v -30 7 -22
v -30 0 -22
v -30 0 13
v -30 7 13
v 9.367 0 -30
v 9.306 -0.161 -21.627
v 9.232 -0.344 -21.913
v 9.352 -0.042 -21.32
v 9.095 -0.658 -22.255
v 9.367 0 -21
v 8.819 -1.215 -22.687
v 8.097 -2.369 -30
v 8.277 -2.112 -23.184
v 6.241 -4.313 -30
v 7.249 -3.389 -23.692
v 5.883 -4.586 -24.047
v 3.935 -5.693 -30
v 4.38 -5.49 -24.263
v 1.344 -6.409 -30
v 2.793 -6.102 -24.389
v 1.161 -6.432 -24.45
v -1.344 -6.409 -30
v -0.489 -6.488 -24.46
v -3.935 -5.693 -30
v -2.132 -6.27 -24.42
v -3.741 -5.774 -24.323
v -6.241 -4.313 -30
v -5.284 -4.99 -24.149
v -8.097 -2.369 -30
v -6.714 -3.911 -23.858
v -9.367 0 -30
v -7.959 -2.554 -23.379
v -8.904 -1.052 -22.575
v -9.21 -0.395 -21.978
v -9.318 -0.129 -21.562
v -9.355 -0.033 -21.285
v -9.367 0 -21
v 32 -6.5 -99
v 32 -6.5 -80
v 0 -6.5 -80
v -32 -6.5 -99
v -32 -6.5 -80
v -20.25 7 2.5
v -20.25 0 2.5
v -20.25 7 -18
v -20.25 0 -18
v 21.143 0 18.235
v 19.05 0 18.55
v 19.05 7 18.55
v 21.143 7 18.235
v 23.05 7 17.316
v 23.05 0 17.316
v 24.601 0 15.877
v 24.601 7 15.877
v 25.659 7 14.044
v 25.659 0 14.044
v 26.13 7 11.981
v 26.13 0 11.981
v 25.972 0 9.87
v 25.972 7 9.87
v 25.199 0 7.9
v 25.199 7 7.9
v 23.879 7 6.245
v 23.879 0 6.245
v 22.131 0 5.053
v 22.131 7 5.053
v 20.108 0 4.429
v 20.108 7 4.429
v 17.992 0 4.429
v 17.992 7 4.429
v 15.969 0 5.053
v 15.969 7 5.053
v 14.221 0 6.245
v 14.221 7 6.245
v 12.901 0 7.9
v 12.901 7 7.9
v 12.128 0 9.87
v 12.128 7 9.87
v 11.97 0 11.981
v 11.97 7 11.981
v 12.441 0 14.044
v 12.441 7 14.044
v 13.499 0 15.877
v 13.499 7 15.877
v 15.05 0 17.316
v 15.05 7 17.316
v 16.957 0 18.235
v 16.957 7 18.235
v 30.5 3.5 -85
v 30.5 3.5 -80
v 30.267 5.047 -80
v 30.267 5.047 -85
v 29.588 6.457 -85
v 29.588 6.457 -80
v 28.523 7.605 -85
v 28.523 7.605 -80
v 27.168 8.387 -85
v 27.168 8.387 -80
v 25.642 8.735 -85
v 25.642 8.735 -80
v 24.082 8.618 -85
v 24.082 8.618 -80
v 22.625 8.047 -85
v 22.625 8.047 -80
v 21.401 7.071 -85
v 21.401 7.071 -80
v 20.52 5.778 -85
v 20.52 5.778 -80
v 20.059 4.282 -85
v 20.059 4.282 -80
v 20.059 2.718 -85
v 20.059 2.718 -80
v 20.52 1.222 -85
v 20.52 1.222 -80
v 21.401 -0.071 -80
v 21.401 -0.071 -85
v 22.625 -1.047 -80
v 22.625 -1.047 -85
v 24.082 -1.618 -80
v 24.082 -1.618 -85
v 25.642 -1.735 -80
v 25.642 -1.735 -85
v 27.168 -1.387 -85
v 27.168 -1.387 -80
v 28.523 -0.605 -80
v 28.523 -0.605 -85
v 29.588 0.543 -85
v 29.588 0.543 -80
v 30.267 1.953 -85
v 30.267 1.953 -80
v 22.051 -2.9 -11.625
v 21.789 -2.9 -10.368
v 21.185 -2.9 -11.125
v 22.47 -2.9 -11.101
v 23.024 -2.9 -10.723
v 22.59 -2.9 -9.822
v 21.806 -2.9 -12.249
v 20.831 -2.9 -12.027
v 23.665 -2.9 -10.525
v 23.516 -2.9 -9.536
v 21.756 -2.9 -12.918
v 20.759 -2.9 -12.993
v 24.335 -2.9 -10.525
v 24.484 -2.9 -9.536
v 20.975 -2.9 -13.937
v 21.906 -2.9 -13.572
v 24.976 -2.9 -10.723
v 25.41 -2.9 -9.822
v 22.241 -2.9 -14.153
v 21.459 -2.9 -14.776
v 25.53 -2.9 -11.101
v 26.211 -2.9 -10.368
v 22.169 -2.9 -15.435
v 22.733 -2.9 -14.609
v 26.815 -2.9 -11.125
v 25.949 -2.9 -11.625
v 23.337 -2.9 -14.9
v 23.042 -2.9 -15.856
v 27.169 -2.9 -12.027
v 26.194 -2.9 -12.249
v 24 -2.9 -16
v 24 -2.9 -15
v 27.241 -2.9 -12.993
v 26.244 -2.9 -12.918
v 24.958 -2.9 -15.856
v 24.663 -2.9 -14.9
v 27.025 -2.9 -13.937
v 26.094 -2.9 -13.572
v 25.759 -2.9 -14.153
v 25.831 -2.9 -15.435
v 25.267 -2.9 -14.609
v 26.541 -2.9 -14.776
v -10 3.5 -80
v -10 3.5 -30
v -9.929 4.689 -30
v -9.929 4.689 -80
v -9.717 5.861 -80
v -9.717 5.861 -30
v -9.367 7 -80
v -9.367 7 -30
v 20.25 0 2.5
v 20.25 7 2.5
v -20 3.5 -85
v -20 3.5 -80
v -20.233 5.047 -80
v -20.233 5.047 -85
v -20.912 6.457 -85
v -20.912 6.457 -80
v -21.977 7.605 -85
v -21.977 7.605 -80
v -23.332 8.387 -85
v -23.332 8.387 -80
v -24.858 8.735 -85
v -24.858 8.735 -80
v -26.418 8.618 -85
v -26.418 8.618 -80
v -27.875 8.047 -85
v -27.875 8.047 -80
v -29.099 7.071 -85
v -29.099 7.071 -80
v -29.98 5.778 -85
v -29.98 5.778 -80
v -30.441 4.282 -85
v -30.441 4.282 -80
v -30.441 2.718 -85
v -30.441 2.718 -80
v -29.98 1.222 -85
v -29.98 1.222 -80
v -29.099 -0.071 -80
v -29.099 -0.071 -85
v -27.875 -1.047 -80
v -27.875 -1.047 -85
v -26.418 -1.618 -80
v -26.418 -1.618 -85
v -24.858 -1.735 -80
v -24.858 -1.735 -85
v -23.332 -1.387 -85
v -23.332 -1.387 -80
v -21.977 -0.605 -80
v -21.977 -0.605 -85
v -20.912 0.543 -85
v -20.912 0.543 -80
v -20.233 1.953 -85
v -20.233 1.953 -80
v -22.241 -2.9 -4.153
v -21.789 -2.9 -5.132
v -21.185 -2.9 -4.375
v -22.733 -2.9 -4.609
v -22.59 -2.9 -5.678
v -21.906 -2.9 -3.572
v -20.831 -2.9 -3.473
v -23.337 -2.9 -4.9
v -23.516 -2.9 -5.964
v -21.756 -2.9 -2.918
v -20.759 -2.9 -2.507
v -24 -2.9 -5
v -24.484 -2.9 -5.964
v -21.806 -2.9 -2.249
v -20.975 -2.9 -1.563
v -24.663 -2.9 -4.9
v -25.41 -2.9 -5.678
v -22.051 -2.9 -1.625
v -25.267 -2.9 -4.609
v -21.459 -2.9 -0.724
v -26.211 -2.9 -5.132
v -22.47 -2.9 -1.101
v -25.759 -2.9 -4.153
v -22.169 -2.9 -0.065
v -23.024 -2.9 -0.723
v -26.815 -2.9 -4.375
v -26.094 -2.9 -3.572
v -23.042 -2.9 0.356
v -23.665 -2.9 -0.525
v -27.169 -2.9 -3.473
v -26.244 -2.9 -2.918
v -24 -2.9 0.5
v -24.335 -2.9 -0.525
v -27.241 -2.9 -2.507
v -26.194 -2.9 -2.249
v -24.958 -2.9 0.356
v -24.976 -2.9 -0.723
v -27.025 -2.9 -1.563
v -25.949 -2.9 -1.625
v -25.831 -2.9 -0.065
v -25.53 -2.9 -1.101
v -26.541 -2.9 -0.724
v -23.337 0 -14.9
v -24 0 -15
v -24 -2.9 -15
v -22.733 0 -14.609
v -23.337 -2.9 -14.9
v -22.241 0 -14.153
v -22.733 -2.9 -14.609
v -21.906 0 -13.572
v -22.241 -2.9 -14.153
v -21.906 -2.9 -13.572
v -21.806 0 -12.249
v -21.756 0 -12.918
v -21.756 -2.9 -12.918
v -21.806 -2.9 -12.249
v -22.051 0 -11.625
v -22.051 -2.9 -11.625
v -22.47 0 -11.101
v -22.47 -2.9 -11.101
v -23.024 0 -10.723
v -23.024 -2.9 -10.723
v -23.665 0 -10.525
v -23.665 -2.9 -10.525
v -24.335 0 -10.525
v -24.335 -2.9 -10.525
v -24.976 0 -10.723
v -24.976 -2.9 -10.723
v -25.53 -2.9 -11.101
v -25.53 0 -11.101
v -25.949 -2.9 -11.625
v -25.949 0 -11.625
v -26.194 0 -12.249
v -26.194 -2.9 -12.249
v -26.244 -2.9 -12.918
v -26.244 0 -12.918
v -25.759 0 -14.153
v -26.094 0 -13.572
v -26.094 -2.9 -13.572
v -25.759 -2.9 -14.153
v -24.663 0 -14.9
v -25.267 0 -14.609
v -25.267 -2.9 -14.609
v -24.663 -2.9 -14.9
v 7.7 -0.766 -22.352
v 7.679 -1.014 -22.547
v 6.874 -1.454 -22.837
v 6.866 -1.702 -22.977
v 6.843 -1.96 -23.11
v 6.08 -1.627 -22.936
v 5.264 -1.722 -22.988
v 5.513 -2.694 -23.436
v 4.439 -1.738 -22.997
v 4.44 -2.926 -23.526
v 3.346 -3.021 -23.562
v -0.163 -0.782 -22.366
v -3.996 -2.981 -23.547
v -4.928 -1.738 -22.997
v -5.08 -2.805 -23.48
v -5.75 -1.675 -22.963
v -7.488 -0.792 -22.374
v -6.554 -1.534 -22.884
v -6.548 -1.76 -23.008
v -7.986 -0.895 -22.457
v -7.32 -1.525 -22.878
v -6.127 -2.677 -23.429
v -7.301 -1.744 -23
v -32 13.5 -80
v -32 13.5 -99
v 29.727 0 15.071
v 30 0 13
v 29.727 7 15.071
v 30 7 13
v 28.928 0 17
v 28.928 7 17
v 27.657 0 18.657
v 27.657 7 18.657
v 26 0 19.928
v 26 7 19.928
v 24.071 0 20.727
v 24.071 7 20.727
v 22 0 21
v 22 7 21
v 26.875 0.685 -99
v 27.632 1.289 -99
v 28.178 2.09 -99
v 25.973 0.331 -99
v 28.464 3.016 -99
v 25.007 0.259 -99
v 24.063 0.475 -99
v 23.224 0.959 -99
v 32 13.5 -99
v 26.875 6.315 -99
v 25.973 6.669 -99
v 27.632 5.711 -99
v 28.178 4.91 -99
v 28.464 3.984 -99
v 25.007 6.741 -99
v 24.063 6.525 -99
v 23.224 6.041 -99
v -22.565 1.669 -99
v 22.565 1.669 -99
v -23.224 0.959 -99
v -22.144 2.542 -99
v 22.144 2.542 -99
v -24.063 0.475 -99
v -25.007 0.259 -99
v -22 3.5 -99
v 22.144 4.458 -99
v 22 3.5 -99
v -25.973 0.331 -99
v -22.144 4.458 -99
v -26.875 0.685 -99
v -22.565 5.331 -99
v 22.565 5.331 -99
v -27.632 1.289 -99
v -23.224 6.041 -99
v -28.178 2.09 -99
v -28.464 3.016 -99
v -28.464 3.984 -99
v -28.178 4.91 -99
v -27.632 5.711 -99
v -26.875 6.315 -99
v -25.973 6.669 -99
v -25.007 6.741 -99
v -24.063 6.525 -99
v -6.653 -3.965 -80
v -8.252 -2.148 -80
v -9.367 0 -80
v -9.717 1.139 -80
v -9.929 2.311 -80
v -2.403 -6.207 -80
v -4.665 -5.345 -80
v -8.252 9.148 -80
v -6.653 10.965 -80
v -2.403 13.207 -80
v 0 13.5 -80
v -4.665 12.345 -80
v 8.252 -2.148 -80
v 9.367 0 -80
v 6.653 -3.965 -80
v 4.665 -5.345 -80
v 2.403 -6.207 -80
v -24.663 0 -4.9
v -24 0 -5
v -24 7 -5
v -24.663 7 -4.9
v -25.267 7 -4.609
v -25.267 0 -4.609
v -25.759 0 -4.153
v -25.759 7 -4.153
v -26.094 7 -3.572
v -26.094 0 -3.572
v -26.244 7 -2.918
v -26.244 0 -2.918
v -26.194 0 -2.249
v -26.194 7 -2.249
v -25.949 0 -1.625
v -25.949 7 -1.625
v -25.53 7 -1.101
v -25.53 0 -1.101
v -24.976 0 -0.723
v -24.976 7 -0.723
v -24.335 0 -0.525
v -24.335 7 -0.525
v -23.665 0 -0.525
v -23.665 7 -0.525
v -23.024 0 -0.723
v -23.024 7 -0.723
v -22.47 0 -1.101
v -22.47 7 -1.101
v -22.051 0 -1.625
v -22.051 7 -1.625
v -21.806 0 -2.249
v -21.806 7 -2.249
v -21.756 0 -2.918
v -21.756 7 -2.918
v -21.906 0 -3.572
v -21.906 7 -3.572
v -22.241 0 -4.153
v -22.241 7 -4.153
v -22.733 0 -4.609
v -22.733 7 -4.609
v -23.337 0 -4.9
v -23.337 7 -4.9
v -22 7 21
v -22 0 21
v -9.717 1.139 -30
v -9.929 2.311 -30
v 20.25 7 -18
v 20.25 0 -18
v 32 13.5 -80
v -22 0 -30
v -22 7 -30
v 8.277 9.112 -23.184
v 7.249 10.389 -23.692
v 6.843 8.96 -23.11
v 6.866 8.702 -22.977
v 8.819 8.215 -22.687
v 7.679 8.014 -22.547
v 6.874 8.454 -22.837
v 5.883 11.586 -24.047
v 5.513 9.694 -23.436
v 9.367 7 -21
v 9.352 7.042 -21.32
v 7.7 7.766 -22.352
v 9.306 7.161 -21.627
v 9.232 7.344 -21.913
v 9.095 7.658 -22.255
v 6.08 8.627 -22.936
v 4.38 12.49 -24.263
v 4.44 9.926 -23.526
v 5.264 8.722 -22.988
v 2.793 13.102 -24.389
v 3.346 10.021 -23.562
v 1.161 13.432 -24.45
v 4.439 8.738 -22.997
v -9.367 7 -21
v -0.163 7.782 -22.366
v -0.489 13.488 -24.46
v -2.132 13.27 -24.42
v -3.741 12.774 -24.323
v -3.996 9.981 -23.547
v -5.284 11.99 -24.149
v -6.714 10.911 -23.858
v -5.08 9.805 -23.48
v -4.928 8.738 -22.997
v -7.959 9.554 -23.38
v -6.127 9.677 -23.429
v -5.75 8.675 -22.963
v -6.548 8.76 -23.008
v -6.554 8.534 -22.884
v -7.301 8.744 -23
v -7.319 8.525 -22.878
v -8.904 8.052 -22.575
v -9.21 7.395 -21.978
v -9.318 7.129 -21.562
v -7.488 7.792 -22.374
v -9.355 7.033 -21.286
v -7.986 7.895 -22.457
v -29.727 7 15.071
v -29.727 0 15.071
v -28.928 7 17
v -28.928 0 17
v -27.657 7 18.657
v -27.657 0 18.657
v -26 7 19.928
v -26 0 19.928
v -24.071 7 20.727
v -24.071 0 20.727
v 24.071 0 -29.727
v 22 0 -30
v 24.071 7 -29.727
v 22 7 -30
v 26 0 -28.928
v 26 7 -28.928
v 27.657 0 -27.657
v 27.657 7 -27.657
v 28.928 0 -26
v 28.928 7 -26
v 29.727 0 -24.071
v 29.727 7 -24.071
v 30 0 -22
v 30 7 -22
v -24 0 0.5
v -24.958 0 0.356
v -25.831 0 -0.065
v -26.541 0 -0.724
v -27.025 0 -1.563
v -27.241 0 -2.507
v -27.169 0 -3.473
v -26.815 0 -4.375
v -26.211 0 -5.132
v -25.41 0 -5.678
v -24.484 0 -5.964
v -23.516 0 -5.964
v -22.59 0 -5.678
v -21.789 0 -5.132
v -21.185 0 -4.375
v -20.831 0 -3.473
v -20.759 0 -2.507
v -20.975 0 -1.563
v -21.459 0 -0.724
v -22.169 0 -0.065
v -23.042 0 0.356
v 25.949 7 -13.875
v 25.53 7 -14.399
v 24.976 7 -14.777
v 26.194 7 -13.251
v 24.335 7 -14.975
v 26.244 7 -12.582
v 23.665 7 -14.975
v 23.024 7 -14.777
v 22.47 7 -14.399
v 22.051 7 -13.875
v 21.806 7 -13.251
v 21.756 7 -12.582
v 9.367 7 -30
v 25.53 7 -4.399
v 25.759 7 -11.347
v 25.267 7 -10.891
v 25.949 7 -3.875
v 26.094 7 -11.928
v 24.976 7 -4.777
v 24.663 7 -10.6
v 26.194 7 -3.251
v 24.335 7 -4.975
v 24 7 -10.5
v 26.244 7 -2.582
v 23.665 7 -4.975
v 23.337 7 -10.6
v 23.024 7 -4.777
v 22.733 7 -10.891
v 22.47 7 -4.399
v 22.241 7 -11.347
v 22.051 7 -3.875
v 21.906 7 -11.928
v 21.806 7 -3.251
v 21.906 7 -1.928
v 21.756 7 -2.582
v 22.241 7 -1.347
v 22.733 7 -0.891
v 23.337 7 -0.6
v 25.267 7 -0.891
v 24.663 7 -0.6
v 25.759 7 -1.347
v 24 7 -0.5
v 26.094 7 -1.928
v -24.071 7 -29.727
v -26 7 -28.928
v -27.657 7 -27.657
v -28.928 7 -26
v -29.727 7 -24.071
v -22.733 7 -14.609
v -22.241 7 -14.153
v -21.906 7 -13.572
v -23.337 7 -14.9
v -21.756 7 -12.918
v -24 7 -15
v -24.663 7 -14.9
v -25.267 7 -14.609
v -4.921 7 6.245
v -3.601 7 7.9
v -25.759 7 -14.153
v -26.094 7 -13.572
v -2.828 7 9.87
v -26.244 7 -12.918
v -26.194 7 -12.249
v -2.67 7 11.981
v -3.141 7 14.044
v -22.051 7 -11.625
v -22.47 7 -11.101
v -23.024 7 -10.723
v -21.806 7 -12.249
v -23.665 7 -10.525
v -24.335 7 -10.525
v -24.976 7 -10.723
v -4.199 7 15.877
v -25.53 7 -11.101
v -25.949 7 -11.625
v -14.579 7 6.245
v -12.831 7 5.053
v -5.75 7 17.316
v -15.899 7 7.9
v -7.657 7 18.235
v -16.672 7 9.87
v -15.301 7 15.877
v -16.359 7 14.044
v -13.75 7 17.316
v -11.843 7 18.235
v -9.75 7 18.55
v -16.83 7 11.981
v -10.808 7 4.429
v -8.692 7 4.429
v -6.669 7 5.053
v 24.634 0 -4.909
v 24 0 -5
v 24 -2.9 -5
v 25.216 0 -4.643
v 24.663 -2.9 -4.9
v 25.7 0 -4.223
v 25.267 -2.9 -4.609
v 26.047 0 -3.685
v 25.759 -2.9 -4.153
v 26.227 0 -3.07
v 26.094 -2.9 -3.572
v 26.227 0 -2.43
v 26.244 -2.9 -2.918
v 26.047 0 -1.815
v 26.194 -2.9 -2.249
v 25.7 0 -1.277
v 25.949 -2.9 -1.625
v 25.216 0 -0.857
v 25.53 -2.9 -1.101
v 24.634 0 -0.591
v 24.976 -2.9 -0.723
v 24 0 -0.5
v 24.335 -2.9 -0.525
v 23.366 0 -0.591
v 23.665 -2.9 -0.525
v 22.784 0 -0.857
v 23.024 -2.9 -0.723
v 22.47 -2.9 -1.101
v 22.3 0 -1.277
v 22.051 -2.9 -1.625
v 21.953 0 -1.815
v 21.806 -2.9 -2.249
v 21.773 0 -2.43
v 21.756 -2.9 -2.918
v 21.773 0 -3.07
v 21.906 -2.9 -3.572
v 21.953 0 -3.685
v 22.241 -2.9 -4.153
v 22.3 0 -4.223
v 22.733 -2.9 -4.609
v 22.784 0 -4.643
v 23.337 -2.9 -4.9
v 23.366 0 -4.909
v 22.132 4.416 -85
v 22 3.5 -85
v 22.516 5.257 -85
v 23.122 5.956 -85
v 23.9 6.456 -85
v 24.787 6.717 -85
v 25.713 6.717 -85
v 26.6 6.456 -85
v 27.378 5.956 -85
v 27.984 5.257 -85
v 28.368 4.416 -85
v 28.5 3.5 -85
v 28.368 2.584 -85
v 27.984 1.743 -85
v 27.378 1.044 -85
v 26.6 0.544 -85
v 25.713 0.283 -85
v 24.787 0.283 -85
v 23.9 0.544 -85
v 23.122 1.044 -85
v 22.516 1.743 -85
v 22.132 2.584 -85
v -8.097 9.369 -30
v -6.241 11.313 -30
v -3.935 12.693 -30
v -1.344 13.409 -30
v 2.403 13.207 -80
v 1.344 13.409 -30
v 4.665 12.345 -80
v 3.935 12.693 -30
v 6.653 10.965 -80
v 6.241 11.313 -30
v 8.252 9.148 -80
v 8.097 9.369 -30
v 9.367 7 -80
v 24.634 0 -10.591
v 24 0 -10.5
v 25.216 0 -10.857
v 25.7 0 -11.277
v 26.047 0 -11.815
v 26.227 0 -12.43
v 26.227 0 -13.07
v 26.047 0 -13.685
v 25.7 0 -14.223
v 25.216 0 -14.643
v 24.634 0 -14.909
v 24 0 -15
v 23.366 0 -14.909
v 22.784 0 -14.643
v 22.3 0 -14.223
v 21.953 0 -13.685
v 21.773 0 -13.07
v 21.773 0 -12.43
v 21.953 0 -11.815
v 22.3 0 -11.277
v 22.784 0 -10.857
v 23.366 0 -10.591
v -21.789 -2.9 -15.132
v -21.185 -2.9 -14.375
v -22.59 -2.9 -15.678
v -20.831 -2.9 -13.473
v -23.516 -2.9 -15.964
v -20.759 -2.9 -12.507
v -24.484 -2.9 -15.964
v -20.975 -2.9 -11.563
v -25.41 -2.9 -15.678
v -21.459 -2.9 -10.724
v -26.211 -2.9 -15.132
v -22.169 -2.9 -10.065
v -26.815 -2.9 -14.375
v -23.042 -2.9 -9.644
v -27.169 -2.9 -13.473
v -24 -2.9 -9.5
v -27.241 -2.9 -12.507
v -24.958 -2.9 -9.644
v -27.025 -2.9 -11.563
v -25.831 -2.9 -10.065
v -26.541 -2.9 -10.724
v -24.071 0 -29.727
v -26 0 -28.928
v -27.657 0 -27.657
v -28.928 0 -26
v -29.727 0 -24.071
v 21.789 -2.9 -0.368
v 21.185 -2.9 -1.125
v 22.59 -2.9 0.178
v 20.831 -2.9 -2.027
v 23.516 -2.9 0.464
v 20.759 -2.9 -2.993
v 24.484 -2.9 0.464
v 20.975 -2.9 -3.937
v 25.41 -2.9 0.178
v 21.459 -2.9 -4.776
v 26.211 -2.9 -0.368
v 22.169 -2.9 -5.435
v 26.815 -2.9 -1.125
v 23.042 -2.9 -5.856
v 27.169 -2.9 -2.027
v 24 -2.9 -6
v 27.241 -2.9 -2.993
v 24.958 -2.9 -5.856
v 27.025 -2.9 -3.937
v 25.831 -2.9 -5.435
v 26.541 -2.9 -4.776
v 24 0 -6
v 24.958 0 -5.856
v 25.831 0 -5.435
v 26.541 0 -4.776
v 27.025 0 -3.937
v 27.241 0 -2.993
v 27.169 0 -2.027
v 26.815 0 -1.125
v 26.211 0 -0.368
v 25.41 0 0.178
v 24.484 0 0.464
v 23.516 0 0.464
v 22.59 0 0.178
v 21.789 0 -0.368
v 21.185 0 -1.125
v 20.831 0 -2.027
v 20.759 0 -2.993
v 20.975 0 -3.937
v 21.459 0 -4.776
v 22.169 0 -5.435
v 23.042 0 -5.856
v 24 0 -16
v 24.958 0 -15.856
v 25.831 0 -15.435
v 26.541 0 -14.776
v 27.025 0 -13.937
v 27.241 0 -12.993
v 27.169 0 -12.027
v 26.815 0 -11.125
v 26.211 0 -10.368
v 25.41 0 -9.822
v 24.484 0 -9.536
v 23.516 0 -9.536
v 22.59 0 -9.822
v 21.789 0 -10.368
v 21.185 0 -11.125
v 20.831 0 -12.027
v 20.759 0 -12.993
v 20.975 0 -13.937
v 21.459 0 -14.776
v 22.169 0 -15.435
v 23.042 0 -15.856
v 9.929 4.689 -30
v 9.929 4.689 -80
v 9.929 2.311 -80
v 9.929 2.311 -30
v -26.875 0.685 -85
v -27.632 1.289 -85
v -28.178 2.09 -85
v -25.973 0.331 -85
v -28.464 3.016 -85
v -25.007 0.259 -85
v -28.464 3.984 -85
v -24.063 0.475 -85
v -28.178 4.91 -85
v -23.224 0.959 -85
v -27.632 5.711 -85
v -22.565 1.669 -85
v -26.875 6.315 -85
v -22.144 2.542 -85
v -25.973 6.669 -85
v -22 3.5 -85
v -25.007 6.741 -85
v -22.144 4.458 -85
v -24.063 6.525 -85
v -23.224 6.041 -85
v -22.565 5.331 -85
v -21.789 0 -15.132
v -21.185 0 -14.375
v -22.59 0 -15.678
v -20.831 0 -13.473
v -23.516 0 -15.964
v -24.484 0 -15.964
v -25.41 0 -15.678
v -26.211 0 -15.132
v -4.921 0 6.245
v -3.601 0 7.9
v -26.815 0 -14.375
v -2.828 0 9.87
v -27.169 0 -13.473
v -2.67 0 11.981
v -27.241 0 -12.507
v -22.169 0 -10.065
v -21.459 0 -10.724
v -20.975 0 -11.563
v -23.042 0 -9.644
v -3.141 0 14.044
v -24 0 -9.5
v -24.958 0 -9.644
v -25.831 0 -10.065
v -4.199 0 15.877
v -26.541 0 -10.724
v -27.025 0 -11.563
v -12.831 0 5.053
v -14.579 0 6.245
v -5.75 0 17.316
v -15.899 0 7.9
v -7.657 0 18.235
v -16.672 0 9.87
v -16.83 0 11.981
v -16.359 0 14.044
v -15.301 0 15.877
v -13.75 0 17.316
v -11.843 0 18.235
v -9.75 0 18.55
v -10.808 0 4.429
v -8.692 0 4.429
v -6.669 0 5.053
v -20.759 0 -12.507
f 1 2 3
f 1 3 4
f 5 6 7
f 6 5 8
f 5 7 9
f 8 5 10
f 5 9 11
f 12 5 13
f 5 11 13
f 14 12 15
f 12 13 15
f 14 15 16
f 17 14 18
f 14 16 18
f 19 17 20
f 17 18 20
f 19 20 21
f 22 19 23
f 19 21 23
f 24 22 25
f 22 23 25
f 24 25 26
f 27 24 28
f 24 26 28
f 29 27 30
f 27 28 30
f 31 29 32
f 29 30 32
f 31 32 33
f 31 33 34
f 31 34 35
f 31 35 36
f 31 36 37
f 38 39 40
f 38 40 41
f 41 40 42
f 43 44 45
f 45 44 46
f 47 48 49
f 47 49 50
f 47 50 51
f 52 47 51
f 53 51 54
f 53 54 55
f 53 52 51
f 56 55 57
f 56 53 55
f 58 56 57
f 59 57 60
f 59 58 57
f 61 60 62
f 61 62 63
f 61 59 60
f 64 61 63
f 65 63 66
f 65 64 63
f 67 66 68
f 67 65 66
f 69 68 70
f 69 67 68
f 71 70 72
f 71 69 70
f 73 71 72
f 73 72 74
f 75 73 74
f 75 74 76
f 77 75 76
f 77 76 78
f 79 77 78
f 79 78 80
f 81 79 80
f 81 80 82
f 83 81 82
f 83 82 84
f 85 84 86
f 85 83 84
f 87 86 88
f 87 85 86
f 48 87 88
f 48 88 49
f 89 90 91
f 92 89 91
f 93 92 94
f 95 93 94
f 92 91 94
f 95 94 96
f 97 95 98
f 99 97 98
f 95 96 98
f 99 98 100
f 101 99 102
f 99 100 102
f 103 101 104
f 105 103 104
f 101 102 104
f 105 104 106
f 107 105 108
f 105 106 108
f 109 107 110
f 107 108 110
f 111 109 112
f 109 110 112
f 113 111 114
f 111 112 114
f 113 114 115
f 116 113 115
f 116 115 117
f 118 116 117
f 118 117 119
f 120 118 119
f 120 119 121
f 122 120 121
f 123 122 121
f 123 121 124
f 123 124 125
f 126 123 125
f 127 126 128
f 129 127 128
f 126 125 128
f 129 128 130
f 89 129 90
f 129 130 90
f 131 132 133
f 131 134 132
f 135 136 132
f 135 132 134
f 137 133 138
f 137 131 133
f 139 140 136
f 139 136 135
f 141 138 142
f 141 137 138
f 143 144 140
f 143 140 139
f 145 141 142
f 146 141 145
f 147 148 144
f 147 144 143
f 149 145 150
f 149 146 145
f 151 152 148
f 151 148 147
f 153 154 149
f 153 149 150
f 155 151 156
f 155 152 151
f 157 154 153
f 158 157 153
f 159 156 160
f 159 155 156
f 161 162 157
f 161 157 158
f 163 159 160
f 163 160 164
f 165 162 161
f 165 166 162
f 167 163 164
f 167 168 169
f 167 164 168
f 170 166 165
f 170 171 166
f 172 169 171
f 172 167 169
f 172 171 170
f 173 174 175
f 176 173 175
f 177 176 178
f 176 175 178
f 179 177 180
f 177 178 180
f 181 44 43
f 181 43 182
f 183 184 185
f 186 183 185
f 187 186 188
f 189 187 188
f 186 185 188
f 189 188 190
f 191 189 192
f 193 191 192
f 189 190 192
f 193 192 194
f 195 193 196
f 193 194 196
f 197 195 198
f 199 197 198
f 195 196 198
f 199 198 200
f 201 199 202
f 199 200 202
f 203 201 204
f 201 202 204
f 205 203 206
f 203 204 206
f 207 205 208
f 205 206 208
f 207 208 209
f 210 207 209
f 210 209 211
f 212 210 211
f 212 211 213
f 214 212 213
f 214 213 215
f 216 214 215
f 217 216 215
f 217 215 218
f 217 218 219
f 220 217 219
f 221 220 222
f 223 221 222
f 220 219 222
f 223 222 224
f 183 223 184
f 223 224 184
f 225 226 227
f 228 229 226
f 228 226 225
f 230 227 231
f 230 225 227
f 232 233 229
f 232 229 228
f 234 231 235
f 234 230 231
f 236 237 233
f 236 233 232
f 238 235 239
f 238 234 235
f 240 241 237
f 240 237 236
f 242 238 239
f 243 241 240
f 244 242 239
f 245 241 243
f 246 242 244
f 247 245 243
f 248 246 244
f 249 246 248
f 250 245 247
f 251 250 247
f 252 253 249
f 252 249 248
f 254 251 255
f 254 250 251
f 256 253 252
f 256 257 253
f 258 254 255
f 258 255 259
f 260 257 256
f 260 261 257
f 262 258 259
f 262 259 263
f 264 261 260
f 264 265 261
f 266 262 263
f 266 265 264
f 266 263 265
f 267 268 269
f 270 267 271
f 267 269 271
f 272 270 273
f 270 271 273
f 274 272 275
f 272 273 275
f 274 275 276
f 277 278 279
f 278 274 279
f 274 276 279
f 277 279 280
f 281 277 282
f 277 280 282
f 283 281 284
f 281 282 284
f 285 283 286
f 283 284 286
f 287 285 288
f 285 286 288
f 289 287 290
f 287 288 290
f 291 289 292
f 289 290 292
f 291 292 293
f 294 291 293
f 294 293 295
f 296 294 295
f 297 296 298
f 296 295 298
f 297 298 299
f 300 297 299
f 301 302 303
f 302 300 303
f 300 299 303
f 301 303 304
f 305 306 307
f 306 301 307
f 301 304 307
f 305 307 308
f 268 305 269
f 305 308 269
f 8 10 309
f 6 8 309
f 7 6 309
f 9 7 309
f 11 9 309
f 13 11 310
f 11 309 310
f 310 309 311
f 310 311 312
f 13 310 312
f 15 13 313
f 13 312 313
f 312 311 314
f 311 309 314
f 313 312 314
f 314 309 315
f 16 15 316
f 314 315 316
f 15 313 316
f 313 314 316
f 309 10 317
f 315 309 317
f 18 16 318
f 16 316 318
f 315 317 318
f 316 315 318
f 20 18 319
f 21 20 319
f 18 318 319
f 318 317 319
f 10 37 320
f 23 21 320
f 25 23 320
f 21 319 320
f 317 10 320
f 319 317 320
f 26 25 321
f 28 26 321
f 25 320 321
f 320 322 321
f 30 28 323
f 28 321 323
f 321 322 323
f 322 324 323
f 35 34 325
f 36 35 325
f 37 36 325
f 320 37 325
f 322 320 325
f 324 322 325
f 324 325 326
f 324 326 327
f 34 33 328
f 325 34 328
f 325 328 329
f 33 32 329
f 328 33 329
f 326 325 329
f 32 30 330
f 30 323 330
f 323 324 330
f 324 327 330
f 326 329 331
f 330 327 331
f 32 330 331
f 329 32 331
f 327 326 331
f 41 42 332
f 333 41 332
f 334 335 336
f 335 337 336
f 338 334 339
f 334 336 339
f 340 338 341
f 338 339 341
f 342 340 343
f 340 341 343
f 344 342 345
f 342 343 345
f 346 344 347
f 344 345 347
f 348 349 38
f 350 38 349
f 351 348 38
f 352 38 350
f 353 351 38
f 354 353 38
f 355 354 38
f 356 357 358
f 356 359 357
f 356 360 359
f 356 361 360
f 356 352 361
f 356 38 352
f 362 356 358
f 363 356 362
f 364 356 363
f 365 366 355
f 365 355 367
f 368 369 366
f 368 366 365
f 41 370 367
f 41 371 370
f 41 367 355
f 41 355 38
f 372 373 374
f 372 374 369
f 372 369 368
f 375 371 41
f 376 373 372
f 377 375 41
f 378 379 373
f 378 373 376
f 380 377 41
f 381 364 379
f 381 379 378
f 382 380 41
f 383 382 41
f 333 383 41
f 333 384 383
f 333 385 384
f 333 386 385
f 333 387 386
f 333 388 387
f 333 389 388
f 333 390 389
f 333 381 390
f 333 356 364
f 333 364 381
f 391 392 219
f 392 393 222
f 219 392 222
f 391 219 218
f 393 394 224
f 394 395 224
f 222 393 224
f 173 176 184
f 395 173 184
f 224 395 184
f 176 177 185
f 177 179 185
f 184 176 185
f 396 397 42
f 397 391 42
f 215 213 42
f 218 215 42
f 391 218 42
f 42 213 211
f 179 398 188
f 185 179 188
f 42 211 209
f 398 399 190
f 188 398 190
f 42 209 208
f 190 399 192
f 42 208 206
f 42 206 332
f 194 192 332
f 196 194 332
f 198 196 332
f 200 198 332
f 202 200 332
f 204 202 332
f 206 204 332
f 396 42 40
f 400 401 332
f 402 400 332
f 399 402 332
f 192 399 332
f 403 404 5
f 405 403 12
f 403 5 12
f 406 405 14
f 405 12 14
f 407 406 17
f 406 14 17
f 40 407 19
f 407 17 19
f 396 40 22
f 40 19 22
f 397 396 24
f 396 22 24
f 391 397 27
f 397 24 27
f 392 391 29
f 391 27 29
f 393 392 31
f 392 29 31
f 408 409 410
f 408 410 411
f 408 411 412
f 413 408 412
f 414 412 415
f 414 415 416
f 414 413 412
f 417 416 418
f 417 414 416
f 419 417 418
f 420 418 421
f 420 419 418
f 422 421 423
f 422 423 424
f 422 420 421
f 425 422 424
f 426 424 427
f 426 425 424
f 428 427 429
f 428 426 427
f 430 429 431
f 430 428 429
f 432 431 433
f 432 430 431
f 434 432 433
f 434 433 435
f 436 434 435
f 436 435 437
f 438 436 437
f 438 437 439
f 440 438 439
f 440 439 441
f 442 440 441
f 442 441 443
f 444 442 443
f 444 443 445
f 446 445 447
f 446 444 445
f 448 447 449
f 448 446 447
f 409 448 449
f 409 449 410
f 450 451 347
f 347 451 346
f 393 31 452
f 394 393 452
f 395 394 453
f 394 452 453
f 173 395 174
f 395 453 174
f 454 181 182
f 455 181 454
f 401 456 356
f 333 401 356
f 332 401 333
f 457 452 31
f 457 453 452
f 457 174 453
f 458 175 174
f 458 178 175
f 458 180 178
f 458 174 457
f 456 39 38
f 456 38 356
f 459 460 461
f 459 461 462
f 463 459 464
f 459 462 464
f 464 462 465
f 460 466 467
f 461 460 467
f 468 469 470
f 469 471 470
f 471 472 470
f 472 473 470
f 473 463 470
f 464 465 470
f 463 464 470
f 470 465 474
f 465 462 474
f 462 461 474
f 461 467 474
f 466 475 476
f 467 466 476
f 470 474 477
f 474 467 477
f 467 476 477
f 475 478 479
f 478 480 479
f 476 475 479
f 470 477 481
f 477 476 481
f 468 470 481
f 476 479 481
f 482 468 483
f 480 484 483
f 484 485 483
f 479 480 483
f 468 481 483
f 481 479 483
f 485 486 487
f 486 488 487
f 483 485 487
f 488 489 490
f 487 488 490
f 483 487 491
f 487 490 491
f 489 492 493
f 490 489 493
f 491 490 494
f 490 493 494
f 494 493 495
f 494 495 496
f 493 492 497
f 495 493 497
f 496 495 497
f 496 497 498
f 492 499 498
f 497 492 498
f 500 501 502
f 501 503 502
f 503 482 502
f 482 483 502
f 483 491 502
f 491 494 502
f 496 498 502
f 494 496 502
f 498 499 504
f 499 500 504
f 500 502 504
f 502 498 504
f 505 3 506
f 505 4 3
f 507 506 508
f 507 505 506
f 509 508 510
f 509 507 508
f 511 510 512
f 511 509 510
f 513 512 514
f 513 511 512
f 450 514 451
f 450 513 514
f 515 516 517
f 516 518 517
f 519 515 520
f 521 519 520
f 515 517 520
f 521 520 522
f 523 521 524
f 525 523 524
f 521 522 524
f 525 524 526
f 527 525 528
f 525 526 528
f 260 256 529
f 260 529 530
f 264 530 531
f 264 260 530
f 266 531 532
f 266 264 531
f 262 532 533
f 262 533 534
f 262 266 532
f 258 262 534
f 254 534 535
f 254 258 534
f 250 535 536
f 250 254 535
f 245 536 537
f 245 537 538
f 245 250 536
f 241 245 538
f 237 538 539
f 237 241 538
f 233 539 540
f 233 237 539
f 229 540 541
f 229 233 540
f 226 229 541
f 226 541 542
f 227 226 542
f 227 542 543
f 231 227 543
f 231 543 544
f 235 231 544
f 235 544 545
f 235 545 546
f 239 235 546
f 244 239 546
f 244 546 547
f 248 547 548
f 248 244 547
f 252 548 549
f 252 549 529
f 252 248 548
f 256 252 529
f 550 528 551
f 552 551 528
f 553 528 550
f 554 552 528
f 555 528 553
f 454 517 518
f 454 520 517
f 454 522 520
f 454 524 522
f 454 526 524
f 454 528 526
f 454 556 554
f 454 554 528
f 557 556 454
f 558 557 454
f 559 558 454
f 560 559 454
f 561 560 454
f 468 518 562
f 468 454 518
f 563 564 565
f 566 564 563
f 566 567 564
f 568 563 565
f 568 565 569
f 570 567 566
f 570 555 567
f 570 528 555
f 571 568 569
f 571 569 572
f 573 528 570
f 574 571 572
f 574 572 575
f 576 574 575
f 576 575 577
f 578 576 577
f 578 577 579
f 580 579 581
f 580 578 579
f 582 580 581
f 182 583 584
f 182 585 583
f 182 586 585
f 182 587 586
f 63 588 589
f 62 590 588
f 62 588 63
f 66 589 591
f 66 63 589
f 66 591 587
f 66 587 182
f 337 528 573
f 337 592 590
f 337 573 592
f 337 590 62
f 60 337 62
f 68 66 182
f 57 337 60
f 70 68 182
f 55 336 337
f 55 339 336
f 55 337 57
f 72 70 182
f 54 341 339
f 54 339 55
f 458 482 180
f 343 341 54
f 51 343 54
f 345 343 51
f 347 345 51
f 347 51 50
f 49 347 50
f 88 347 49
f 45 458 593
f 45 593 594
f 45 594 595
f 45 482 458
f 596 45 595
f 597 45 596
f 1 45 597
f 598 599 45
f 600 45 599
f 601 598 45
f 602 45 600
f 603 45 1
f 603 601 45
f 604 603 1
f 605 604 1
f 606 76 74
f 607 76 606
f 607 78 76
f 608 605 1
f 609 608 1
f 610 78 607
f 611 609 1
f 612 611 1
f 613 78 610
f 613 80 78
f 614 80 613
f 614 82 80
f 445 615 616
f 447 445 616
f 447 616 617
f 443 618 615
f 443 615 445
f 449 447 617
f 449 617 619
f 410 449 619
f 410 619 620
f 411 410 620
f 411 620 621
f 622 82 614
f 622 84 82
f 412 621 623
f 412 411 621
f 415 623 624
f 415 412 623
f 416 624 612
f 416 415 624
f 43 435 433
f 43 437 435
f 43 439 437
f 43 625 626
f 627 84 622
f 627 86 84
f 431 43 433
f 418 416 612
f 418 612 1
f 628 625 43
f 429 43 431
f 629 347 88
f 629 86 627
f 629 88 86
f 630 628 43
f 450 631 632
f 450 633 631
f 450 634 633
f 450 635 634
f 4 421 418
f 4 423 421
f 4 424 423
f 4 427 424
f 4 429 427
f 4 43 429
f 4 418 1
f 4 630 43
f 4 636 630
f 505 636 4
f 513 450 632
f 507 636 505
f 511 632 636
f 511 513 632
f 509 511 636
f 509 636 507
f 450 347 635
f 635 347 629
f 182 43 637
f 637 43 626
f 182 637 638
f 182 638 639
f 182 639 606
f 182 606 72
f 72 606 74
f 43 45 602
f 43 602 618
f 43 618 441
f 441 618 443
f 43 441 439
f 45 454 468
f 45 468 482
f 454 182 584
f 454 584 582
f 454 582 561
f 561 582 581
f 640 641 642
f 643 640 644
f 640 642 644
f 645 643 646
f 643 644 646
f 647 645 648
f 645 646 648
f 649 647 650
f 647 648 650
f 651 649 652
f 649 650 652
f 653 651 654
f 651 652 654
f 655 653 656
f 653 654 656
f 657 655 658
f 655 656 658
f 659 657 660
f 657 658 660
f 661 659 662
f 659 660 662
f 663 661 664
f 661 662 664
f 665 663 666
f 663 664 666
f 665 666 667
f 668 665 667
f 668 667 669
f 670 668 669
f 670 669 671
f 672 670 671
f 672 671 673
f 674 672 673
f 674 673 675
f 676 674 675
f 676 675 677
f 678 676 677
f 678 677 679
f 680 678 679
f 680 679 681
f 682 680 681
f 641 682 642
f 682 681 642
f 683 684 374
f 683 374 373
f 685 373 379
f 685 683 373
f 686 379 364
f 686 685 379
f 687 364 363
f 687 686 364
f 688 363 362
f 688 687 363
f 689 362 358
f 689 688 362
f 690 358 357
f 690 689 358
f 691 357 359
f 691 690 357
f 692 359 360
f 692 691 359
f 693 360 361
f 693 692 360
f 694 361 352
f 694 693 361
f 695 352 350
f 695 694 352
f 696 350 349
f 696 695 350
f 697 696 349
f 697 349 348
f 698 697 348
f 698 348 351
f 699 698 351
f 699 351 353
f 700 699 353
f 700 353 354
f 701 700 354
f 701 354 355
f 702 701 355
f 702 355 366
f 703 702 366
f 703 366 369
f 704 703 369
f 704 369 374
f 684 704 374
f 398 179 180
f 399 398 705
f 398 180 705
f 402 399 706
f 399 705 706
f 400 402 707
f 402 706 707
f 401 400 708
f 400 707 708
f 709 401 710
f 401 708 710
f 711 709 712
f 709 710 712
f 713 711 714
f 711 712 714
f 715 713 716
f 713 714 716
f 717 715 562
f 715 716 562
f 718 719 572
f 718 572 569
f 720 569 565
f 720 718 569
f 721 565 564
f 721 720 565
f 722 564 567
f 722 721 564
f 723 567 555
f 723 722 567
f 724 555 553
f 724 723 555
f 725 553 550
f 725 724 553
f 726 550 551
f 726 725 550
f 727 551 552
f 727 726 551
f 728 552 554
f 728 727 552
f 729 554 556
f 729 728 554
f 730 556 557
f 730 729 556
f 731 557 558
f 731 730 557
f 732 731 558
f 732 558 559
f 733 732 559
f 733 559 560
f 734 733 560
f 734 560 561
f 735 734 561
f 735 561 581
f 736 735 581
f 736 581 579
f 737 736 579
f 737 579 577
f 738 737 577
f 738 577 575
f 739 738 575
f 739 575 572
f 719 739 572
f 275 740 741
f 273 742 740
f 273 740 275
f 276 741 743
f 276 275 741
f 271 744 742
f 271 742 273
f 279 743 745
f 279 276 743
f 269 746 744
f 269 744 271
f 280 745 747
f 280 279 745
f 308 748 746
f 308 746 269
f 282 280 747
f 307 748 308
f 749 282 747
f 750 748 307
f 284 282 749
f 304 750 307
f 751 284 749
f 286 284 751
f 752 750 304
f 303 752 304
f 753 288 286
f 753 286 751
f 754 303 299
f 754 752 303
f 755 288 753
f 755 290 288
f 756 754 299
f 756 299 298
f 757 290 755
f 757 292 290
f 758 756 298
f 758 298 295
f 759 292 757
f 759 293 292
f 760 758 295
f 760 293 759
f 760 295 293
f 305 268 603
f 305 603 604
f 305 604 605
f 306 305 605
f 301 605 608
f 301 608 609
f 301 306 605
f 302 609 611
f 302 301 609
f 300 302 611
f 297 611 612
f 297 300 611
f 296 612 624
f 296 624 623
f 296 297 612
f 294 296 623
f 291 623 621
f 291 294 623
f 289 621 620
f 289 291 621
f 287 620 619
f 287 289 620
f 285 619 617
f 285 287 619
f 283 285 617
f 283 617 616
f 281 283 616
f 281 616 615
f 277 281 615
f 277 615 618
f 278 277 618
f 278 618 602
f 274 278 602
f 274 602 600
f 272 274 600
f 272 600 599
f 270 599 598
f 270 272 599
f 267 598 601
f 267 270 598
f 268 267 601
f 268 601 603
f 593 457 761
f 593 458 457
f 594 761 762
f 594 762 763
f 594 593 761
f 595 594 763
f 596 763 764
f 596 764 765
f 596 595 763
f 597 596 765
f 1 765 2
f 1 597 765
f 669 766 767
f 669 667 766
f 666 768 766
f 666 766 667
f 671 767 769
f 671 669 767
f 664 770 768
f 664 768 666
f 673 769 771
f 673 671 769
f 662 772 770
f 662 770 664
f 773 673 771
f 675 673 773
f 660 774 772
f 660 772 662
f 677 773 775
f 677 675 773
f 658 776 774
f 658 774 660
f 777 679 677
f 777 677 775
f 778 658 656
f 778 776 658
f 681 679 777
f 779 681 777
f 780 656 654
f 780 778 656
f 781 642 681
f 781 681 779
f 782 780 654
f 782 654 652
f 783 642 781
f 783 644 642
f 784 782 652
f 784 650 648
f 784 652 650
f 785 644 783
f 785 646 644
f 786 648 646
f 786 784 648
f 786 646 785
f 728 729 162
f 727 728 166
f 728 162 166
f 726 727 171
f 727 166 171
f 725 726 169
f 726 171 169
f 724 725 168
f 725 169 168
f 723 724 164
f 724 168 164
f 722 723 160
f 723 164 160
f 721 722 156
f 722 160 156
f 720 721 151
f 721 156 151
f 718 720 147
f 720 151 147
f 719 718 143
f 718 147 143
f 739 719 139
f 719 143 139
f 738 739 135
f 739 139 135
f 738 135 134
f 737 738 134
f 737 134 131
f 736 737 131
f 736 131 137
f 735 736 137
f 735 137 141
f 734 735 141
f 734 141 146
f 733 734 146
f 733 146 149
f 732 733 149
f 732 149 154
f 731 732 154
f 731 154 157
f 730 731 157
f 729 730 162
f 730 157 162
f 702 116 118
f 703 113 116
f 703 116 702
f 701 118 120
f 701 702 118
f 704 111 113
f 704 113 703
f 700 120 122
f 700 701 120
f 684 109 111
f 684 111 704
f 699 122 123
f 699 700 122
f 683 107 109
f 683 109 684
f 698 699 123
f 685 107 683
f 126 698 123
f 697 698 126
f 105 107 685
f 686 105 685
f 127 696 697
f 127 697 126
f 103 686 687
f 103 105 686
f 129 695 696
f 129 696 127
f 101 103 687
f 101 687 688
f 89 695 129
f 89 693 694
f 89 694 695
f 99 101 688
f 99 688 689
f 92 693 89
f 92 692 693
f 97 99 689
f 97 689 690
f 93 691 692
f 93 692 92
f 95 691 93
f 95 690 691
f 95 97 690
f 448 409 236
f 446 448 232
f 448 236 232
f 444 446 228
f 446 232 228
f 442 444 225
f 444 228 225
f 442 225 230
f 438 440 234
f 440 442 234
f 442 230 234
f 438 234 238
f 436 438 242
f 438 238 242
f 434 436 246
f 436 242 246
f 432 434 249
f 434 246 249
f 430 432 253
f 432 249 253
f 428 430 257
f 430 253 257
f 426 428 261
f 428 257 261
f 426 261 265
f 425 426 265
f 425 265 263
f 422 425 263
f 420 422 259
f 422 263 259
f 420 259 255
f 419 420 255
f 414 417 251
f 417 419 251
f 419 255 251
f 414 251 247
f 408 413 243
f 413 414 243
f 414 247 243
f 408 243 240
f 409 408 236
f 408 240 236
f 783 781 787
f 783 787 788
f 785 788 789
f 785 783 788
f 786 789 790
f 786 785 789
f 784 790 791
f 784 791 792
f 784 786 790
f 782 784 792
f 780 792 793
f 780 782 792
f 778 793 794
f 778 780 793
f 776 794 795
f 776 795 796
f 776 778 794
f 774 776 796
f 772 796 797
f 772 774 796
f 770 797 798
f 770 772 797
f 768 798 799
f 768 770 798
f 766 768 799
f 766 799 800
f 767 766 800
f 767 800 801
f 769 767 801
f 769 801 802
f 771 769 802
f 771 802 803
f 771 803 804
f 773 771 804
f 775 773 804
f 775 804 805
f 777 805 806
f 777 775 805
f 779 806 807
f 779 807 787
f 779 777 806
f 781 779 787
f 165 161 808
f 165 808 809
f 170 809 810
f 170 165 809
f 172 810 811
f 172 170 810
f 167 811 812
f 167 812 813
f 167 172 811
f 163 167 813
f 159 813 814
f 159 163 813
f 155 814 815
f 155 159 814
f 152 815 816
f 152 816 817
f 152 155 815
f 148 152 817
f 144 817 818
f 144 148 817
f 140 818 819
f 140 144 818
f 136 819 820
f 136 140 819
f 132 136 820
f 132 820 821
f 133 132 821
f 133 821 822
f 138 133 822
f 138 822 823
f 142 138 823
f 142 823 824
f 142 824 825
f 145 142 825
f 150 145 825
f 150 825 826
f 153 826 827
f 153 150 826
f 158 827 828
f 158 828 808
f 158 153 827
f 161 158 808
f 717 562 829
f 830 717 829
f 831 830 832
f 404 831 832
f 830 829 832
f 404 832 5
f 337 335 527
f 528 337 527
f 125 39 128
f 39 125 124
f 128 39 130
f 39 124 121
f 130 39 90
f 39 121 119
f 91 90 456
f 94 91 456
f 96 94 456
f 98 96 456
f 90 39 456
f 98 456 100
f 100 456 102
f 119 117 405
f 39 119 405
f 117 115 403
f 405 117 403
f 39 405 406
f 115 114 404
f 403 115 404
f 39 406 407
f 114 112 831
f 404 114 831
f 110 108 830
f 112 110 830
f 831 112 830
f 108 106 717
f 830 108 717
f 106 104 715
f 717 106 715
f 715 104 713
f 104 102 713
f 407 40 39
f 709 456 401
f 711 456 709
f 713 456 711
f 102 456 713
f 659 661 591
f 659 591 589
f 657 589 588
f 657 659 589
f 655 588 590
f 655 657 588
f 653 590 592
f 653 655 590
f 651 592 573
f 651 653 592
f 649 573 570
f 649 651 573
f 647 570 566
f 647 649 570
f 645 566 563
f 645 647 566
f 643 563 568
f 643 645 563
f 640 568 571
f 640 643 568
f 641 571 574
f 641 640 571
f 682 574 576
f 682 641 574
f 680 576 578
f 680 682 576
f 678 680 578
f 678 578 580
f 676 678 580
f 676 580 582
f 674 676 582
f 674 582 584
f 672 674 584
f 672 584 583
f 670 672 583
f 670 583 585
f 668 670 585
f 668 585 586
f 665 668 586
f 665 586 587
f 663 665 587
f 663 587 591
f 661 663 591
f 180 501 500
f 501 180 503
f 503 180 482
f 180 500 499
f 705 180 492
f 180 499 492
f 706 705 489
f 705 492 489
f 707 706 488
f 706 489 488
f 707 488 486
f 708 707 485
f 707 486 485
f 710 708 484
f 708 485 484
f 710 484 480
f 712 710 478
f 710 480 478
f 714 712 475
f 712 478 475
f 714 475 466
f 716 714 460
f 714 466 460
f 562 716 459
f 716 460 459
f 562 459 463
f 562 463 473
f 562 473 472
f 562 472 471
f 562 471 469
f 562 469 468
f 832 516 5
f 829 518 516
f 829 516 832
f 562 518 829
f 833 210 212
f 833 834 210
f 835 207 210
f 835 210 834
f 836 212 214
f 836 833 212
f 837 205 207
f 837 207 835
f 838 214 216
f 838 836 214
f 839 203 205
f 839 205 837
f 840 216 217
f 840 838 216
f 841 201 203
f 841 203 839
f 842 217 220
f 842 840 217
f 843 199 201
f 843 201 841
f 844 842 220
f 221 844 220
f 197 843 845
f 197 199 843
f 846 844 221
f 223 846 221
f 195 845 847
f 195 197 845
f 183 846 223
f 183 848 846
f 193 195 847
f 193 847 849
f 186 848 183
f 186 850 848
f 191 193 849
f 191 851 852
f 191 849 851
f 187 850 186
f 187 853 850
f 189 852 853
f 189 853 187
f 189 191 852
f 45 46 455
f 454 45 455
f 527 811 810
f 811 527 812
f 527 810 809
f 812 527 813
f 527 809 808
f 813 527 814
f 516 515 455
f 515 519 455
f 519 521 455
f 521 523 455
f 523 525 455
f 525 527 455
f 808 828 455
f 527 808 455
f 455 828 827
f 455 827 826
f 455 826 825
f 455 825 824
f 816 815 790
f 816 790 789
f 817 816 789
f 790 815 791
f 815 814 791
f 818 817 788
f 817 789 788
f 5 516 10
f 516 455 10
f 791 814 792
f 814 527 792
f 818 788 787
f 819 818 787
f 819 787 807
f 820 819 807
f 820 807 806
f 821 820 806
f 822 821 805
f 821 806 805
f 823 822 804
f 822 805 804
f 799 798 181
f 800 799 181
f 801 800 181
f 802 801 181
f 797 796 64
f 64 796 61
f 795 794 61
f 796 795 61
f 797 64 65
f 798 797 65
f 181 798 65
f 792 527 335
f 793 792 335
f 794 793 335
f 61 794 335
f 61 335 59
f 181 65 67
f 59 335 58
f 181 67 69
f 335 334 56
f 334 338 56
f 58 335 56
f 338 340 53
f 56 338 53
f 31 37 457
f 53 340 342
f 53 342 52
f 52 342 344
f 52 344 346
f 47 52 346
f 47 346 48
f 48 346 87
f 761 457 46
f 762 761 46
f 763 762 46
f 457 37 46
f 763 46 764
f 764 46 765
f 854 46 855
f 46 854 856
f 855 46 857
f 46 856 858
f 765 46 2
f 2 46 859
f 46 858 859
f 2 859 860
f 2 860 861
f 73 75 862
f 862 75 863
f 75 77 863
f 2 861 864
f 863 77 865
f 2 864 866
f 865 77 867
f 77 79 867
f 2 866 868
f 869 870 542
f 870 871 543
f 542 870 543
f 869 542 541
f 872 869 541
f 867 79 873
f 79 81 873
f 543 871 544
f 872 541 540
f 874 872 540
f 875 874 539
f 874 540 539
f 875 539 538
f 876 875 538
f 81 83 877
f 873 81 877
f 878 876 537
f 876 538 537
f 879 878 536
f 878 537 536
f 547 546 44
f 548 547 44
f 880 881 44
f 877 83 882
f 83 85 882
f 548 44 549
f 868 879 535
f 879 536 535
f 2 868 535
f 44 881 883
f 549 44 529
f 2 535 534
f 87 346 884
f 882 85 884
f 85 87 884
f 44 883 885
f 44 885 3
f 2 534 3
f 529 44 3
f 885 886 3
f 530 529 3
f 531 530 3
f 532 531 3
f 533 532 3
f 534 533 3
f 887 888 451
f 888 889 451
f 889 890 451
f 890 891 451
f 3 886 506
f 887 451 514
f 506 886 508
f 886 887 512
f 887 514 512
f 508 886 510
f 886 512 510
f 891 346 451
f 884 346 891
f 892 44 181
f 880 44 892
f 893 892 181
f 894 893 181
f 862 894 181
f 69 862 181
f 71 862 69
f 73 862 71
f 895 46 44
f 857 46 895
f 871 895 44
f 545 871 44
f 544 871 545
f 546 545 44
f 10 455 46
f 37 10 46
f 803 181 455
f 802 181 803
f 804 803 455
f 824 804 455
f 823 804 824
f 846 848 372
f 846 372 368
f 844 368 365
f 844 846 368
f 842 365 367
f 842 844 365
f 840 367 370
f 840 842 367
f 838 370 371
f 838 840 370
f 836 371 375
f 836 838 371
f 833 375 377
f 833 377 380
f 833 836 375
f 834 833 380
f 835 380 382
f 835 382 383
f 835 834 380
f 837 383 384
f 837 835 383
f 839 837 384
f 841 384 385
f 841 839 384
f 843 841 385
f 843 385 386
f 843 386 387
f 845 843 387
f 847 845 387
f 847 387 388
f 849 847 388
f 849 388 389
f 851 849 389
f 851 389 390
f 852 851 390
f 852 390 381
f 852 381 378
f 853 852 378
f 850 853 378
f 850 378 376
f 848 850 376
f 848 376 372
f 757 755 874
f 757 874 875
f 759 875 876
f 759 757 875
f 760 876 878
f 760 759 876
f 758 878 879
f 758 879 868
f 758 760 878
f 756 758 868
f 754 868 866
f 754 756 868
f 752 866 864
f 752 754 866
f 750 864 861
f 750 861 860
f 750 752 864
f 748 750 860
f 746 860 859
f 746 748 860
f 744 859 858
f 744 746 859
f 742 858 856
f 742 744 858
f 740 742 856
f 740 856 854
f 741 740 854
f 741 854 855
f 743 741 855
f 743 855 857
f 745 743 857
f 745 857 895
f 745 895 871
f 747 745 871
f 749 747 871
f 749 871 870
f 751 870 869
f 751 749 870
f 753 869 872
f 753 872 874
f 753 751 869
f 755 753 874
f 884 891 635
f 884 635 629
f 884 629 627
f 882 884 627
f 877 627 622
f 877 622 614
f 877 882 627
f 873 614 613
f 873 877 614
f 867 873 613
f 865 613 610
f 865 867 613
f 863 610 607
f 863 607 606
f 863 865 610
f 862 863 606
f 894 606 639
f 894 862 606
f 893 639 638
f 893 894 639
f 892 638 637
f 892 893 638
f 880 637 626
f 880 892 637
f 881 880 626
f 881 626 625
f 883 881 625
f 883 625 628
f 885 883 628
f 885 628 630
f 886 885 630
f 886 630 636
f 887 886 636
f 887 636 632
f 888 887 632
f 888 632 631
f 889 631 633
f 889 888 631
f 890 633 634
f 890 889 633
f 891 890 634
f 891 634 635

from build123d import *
from build123d.topology import SkipClean

# Parameters (mm, degrees)
SKETCH1_W           = 60
SKETCH1_H           = 42
SKETCH1_R           = 7.1
SKETCH1_R_2         = 2.25
SKETCH1_W_2         = 40.5
SKETCH1_H_2         = 20.5
BOSS_EXTRUDE1_DEPTH = 7
BOSS_EXTRUDE2_START = 2.9
SKETCH2_R           = 3.25
SKETCH2_R_2         = 2.25
BOSS_EXTRUDE2_DEPTH = 2.9
SKETCH3_R           = 10
SKETCH3_W           = 60
SKETCH3_H           = 7
BOSS_EXTRUDE3_DEPTH = 9
SKETCH4_RX          = 13.02
SKETCH4_RY          = 4
CUT_EXTRUDE1_DEPTH  = 69.426968368
FILLET1_R           = 8
BOSS_EXTRUDE4_DEPTH = 50
SKETCH6_W           = 64
SKETCH6_H           = 20
SKETCH6_R           = 3.25
BOSS_EXTRUDE5_DEPTH = 19
SKETCH7_R           = 5.25
SKETCH7_R_2         = 3.25
CUT_EXTRUDE2_DEPTH  = 5


with BuildPart() as part:
    # Sketch1 → Boss-Extrude1 (new body)
    with BuildSketch(Plane(origin=(0, 0, 0), x_dir=(1, 0, 0), z_dir=(0, 1, 0))):
        Rectangle(SKETCH1_W, SKETCH1_H)
        with Locations(Location((-9.75, -11.45, 0), (0, 0, 270))):
            Circle(SKETCH1_R, mode=Mode.SUBTRACT)
        with Locations(Location((19.05, -11.45, 0), (0, 0, 270))):
            Circle(SKETCH1_R, mode=Mode.SUBTRACT)
        with Locations(Location((24, 12.75, 0), (0, 0, 270))):
            Circle(SKETCH1_R_2, mode=Mode.SUBTRACT)
        with Locations(Location((24, 2.75, 0), (0, 0, 270))):
            Circle(SKETCH1_R_2, mode=Mode.SUBTRACT)
        with Locations(Location((-24, 2.75, 0), (0, 0, 90))):
            Circle(SKETCH1_R_2, mode=Mode.SUBTRACT)
        with Locations(Location((-24, 12.75, 0), (0, 0, 90))):
            Circle(SKETCH1_R_2, mode=Mode.SUBTRACT)
        with Locations((0, 7.75)):
            Rectangle(SKETCH1_W_2, SKETCH1_H_2, mode=Mode.SUBTRACT)
    extrude(amount=BOSS_EXTRUDE1_DEPTH)

    # Sketch2 → Boss-Extrude2 (add)
    # profile 1 of 4: a face of its own
    with SkipClean():  # the faces are left unmerged after this step: merging them gives an invalid solid
        with BuildSketch(Plane.XZ.offset(BOSS_EXTRUDE2_START)):
            with Locations(Location((24, -2.75, 0), (0, 0, 270))):
                Circle(SKETCH2_R)
            with Locations(Location((24, -2.75, 0), (0, 0, 270))):
                Circle(SKETCH2_R_2, mode=Mode.SUBTRACT)
        # profile 2 of 4: a face of its own
        with BuildSketch(Plane.XZ.offset(BOSS_EXTRUDE2_START)):
            with Locations(Location((24, -12.75, 0), (0, 0, 270))):
                Circle(SKETCH2_R)
            with Locations(Location((24, -12.75, 0), (0, 0, 270))):
                Circle(SKETCH2_R_2, mode=Mode.SUBTRACT)
        # profile 3 of 4: a face of its own
        with BuildSketch(Plane.XZ.offset(BOSS_EXTRUDE2_START)):
            with Locations(Location((-24, -12.75, 0), (0, 0, 90))):
                Circle(SKETCH2_R)
            with Locations(Location((-24, -12.75, 0), (0, 0, 270))):
                Circle(SKETCH2_R_2, mode=Mode.SUBTRACT)
        # profile 4 of 4: a face of its own
        with BuildSketch(Plane.XZ.offset(BOSS_EXTRUDE2_START)):
            with Locations(Location((-24, -2.75, 0), (0, 0, 90))):
                Circle(SKETCH2_R)
            with Locations(Location((-24, -2.75, 0), (0, 0, 270))):
                Circle(SKETCH2_R_2, mode=Mode.SUBTRACT)
        extrude(amount=-BOSS_EXTRUDE2_DEPTH)

    # Sketch3 → Boss-Extrude3 (add)
    with SkipClean():  # the faces are left unmerged after this step: merging them gives an invalid solid
        with BuildSketch(Plane(origin=(0, 0, -21), x_dir=(-1, 0, 0), z_dir=(0, 0, -1))):
            with Locations((0, 3.5)):
                Circle(SKETCH3_R)
            with Locations((0, 3.5)):
                Rectangle(SKETCH3_W, SKETCH3_H)
        extrude(amount=BOSS_EXTRUDE3_DEPTH)

    # Sketch4 → Cut-Extrude1 (cut, through all)
    with SkipClean():  # the faces are left unmerged after this step: merging them gives an invalid solid
        with BuildSketch(Plane.ZY.offset(30)):
            with Locations(Location((-21, 20.02), (0, 0, -90))):
                Ellipse(SKETCH4_RX, SKETCH4_RY)
            with Locations(Location((-21, -13.02), (0, 0, 90))):
                Ellipse(SKETCH4_RX, SKETCH4_RY)
        extrude(amount=-CUT_EXTRUDE1_DEPTH, mode=Mode.SUBTRACT)

    # Fillet1
    fillet1_edges = [part.edges().sort_by_distance(p)[0] for p in [
        (30, 3.5, 21),
        (-30, 3.5, 21),
        (30, 3.5, -30),
        (-30, 3.5, -30),
    ]]
    fillet(fillet1_edges, radius=FILLET1_R)

    # Sketch5 → Boss-Extrude4 (add)
    with SkipClean():  # the faces are left unmerged after this step: merging them gives an invalid solid
        with BuildSketch(Plane(origin=(0, 0, -30), x_dir=(-1, 0, 0), z_dir=(0, 0, -1))):
            with BuildLine():
                ThreePointArc((10, 3.5), (9.840603893, 5.278346145), (9.367496998, 7))
                ThreePointArc((9.367496998, 7), (0, 13.5), (-9.367496998, 7))
                ThreePointArc((-9.367496998, 7), (-10, 3.5), (-9.367496998, 0))
                ThreePointArc((-9.367496998, 0), (0, -6.5), (9.367496998, 0))
                ThreePointArc((9.367496998, 0), (9.840603893, 1.721653855), (10, 3.5))
            make_face()
        extrude(amount=BOSS_EXTRUDE4_DEPTH)

    # Sketch6 → Boss-Extrude5 (add)
    with SkipClean():  # the faces are left unmerged after this step: merging them gives an invalid solid
        with BuildSketch(Plane(origin=(0, 0, -80), x_dir=(-1, 0, 0), z_dir=(0, 0, -1))):
            with Locations((0, 3.5)):
                Rectangle(SKETCH6_W, SKETCH6_H)
            with Locations((-25.25, 3.5)):
                Circle(SKETCH6_R, mode=Mode.SUBTRACT)
            with Locations(Location((25.25, 3.5, 0), (0, 0, 180))):
                Circle(SKETCH6_R, mode=Mode.SUBTRACT)
        extrude(amount=BOSS_EXTRUDE5_DEPTH)

    # Sketch7 → Cut-Extrude2 (cut)
    # profile 1 of 2: a face of its own
    with SkipClean():  # the faces are left unmerged after this step: merging them gives an invalid solid
        with BuildSketch(Plane.XY.offset(-80)):
            with Locations((25.25, 3.5)):
                Circle(SKETCH7_R)
            with Locations((25.25, 3.5)):
                Circle(SKETCH7_R_2, mode=Mode.SUBTRACT)
        # profile 2 of 2: a face of its own
        with BuildSketch(Plane.XY.offset(-80)):
            with Locations((-25.25, 3.5)):
                Circle(SKETCH7_R)
            with Locations((-25.25, 3.5)):
                Circle(SKETCH7_R_2, mode=Mode.SUBTRACT)
        extrude(amount=-CUT_EXTRUDE2_DEPTH, mode=Mode.SUBTRACT)


solid = part.part
